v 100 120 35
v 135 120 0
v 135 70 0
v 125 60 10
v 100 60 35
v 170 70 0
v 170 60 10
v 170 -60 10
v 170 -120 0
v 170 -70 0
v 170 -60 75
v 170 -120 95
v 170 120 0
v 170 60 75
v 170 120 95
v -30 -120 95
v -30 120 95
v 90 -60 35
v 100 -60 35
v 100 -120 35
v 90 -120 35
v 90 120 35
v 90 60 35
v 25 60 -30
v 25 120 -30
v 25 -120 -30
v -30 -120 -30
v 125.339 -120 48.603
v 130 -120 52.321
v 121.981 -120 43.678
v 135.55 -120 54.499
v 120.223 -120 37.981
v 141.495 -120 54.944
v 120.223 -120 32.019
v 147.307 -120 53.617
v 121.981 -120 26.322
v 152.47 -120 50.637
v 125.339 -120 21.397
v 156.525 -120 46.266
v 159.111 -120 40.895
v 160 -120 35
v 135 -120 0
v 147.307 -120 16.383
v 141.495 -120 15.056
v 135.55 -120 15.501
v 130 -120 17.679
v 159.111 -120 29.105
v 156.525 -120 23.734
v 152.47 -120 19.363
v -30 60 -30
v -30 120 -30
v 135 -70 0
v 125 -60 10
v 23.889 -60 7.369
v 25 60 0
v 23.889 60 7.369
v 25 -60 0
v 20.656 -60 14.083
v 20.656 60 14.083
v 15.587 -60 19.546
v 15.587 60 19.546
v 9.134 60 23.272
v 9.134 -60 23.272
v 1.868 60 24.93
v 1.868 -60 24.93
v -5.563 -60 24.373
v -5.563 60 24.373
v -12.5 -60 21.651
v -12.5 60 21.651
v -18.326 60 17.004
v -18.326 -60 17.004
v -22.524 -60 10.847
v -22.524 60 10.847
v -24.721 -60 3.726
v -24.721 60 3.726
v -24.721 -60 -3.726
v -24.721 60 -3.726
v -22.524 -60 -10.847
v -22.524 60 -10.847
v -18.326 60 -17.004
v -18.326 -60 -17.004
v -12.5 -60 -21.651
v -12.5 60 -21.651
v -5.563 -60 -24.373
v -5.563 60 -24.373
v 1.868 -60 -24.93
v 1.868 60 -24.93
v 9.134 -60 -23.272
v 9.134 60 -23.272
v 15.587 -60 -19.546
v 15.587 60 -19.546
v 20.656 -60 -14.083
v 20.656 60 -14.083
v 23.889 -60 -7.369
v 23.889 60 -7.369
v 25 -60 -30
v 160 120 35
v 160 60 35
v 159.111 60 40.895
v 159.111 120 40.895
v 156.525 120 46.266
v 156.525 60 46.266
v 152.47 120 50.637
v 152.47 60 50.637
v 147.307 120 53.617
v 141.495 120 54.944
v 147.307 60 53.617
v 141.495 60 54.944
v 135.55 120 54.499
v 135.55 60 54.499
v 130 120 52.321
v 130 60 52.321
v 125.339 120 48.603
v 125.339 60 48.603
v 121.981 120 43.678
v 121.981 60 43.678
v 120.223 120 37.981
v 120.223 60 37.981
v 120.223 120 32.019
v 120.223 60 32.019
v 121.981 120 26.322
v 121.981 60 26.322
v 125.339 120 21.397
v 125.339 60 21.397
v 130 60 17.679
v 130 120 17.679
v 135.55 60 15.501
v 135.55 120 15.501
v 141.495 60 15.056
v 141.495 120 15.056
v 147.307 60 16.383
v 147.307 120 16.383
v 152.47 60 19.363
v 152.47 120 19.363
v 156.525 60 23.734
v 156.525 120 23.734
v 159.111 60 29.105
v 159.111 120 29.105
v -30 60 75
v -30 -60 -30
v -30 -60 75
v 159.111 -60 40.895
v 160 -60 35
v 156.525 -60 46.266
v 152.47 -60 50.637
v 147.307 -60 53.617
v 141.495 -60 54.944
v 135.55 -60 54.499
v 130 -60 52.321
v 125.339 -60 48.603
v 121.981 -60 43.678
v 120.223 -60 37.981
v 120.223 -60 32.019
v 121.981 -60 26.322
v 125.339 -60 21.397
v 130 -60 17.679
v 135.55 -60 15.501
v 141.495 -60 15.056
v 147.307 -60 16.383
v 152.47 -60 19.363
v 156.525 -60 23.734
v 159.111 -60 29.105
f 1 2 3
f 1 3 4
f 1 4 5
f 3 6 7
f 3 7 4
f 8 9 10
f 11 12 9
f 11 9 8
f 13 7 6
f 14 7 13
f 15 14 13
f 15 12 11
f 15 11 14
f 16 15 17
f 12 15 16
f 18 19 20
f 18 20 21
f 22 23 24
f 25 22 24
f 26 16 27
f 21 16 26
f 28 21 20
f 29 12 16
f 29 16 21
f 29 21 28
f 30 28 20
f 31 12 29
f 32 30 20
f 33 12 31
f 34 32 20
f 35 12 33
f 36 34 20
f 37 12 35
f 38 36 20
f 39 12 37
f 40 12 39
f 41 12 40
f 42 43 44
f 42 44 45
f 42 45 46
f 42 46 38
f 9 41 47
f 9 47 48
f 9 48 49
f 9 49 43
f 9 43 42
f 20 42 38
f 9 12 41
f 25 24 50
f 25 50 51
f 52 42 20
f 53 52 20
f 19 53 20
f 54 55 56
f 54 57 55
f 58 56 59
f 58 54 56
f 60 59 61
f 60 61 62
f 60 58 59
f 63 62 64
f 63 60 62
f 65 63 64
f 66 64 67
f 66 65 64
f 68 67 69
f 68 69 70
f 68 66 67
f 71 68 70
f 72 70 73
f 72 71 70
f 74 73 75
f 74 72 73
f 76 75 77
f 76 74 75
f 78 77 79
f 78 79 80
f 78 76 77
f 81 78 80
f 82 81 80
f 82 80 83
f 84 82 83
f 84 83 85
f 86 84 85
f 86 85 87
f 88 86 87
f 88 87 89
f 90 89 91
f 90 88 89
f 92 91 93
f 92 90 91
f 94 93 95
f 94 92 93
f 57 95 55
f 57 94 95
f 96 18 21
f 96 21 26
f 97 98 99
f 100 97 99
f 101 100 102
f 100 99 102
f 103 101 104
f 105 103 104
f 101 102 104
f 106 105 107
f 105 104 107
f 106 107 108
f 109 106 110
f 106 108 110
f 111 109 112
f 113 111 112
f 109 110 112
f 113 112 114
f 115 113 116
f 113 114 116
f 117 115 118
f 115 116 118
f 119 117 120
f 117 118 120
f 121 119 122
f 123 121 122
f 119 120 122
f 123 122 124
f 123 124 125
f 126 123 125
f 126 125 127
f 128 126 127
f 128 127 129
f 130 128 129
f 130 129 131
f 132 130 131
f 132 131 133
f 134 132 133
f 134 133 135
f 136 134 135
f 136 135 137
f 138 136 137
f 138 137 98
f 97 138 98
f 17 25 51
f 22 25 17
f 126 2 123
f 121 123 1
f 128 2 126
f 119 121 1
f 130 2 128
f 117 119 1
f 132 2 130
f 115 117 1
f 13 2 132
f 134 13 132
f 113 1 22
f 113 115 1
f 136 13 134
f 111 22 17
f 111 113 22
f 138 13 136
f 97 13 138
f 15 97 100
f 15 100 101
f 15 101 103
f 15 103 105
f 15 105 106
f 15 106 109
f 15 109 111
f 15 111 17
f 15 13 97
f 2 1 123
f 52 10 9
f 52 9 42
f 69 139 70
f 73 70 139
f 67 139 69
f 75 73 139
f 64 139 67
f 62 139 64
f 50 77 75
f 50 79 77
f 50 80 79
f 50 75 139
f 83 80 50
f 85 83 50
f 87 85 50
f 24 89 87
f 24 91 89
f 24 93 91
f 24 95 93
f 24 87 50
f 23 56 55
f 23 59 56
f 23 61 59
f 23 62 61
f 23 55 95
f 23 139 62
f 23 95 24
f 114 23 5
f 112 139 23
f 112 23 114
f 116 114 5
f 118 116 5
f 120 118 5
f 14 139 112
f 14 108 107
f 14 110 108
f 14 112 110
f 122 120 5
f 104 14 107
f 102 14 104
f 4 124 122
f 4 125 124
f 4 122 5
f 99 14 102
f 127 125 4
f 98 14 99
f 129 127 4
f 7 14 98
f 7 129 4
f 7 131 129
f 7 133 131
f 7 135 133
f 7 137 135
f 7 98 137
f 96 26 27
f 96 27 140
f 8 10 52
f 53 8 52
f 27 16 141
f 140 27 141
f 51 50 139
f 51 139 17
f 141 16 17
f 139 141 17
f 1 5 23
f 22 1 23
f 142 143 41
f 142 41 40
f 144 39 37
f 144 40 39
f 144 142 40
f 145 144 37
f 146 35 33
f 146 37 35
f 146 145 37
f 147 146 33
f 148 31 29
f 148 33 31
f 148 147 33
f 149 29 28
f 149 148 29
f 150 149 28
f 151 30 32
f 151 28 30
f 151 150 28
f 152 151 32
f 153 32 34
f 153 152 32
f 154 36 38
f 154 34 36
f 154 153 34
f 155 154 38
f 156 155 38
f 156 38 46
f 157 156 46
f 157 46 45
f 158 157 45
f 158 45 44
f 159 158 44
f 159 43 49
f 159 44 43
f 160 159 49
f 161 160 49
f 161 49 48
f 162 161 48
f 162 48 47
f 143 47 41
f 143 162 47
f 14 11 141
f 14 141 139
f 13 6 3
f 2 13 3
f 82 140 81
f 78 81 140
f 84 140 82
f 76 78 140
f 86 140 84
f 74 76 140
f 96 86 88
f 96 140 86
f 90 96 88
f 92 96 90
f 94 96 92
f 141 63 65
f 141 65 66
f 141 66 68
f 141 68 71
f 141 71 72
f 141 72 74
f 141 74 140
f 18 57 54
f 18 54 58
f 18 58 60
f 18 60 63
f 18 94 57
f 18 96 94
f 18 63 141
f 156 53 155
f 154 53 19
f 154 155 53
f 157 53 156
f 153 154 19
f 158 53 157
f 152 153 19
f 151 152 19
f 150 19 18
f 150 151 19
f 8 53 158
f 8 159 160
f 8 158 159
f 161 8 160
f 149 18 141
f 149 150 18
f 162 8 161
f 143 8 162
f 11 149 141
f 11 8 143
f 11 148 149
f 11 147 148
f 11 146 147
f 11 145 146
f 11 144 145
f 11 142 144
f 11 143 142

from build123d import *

# Parameters (mm, degrees)
F1_DEPTH      = 170
F1_DEPTH_BACK = 30
F2_R          = 25
F3_DEPTH      = 60
F3_DEPTH_BACK = 60
F5_DEPTH      = 120.001
F5_DEPTH_BACK = 120.001
F6_R          = 20
F7_DEPTH      = 120.001
F7_DEPTH_BACK = 120.001
F8_SIZE       = 10


# Not quite as in the source:
# - a feature names something its author has since deleted; it is built from what else it names


with BuildPart() as f1:
    # F0 (on Right) → F1 (new body, two sides)
    with BuildSketch(Plane.YZ) as f1_sk:
        Polygon((-120, 95), (-120, -30), (-60, -30), (-60, 75), (0, 75), (60, 75), (60, -30), (120, -30), (120, 95), (0, 95), align=None)
    extrude(amount=F1_DEPTH)
    extrude(f1_sk.sketch, amount=-F1_DEPTH_BACK)

    # F2 (on Front) → F3 (join, two sides)
    with BuildSketch(Plane.XZ) as f3_sk:
        Circle(F2_R)
    extrude(amount=F3_DEPTH)
    extrude(f3_sk.sketch, amount=-F3_DEPTH_BACK)

    # F4 (on Front) → F5 (cut, two sides)
    with BuildSketch(Plane.XZ) as f5_sk:
        Polygon((170, -30), (170, 0), (135, 0), (100, 35), (90, 35), (25, -30), align=None)
    extrude(amount=-F5_DEPTH, mode=Mode.SUBTRACT)
    extrude(f5_sk.sketch, amount=F5_DEPTH_BACK, mode=Mode.SUBTRACT)

    # F6 (on Front) → F7 (cut, two sides)
    with BuildSketch(Plane.XZ) as f7_sk:
        with Locations((140, 35)):
            Circle(F6_R)
    extrude(amount=-F7_DEPTH, mode=Mode.SUBTRACT)
    extrude(f7_sk.sketch, amount=F7_DEPTH_BACK, mode=Mode.SUBTRACT)

    # F8
    f8_edges = [f1.edges().sort_by_distance(p)[0] for p in [
        (152.5, -60, 0),
        (152.5, 60, 0),
    ]]
    chamfer(f8_edges, length=F8_SIZE)


solid = f1.part
